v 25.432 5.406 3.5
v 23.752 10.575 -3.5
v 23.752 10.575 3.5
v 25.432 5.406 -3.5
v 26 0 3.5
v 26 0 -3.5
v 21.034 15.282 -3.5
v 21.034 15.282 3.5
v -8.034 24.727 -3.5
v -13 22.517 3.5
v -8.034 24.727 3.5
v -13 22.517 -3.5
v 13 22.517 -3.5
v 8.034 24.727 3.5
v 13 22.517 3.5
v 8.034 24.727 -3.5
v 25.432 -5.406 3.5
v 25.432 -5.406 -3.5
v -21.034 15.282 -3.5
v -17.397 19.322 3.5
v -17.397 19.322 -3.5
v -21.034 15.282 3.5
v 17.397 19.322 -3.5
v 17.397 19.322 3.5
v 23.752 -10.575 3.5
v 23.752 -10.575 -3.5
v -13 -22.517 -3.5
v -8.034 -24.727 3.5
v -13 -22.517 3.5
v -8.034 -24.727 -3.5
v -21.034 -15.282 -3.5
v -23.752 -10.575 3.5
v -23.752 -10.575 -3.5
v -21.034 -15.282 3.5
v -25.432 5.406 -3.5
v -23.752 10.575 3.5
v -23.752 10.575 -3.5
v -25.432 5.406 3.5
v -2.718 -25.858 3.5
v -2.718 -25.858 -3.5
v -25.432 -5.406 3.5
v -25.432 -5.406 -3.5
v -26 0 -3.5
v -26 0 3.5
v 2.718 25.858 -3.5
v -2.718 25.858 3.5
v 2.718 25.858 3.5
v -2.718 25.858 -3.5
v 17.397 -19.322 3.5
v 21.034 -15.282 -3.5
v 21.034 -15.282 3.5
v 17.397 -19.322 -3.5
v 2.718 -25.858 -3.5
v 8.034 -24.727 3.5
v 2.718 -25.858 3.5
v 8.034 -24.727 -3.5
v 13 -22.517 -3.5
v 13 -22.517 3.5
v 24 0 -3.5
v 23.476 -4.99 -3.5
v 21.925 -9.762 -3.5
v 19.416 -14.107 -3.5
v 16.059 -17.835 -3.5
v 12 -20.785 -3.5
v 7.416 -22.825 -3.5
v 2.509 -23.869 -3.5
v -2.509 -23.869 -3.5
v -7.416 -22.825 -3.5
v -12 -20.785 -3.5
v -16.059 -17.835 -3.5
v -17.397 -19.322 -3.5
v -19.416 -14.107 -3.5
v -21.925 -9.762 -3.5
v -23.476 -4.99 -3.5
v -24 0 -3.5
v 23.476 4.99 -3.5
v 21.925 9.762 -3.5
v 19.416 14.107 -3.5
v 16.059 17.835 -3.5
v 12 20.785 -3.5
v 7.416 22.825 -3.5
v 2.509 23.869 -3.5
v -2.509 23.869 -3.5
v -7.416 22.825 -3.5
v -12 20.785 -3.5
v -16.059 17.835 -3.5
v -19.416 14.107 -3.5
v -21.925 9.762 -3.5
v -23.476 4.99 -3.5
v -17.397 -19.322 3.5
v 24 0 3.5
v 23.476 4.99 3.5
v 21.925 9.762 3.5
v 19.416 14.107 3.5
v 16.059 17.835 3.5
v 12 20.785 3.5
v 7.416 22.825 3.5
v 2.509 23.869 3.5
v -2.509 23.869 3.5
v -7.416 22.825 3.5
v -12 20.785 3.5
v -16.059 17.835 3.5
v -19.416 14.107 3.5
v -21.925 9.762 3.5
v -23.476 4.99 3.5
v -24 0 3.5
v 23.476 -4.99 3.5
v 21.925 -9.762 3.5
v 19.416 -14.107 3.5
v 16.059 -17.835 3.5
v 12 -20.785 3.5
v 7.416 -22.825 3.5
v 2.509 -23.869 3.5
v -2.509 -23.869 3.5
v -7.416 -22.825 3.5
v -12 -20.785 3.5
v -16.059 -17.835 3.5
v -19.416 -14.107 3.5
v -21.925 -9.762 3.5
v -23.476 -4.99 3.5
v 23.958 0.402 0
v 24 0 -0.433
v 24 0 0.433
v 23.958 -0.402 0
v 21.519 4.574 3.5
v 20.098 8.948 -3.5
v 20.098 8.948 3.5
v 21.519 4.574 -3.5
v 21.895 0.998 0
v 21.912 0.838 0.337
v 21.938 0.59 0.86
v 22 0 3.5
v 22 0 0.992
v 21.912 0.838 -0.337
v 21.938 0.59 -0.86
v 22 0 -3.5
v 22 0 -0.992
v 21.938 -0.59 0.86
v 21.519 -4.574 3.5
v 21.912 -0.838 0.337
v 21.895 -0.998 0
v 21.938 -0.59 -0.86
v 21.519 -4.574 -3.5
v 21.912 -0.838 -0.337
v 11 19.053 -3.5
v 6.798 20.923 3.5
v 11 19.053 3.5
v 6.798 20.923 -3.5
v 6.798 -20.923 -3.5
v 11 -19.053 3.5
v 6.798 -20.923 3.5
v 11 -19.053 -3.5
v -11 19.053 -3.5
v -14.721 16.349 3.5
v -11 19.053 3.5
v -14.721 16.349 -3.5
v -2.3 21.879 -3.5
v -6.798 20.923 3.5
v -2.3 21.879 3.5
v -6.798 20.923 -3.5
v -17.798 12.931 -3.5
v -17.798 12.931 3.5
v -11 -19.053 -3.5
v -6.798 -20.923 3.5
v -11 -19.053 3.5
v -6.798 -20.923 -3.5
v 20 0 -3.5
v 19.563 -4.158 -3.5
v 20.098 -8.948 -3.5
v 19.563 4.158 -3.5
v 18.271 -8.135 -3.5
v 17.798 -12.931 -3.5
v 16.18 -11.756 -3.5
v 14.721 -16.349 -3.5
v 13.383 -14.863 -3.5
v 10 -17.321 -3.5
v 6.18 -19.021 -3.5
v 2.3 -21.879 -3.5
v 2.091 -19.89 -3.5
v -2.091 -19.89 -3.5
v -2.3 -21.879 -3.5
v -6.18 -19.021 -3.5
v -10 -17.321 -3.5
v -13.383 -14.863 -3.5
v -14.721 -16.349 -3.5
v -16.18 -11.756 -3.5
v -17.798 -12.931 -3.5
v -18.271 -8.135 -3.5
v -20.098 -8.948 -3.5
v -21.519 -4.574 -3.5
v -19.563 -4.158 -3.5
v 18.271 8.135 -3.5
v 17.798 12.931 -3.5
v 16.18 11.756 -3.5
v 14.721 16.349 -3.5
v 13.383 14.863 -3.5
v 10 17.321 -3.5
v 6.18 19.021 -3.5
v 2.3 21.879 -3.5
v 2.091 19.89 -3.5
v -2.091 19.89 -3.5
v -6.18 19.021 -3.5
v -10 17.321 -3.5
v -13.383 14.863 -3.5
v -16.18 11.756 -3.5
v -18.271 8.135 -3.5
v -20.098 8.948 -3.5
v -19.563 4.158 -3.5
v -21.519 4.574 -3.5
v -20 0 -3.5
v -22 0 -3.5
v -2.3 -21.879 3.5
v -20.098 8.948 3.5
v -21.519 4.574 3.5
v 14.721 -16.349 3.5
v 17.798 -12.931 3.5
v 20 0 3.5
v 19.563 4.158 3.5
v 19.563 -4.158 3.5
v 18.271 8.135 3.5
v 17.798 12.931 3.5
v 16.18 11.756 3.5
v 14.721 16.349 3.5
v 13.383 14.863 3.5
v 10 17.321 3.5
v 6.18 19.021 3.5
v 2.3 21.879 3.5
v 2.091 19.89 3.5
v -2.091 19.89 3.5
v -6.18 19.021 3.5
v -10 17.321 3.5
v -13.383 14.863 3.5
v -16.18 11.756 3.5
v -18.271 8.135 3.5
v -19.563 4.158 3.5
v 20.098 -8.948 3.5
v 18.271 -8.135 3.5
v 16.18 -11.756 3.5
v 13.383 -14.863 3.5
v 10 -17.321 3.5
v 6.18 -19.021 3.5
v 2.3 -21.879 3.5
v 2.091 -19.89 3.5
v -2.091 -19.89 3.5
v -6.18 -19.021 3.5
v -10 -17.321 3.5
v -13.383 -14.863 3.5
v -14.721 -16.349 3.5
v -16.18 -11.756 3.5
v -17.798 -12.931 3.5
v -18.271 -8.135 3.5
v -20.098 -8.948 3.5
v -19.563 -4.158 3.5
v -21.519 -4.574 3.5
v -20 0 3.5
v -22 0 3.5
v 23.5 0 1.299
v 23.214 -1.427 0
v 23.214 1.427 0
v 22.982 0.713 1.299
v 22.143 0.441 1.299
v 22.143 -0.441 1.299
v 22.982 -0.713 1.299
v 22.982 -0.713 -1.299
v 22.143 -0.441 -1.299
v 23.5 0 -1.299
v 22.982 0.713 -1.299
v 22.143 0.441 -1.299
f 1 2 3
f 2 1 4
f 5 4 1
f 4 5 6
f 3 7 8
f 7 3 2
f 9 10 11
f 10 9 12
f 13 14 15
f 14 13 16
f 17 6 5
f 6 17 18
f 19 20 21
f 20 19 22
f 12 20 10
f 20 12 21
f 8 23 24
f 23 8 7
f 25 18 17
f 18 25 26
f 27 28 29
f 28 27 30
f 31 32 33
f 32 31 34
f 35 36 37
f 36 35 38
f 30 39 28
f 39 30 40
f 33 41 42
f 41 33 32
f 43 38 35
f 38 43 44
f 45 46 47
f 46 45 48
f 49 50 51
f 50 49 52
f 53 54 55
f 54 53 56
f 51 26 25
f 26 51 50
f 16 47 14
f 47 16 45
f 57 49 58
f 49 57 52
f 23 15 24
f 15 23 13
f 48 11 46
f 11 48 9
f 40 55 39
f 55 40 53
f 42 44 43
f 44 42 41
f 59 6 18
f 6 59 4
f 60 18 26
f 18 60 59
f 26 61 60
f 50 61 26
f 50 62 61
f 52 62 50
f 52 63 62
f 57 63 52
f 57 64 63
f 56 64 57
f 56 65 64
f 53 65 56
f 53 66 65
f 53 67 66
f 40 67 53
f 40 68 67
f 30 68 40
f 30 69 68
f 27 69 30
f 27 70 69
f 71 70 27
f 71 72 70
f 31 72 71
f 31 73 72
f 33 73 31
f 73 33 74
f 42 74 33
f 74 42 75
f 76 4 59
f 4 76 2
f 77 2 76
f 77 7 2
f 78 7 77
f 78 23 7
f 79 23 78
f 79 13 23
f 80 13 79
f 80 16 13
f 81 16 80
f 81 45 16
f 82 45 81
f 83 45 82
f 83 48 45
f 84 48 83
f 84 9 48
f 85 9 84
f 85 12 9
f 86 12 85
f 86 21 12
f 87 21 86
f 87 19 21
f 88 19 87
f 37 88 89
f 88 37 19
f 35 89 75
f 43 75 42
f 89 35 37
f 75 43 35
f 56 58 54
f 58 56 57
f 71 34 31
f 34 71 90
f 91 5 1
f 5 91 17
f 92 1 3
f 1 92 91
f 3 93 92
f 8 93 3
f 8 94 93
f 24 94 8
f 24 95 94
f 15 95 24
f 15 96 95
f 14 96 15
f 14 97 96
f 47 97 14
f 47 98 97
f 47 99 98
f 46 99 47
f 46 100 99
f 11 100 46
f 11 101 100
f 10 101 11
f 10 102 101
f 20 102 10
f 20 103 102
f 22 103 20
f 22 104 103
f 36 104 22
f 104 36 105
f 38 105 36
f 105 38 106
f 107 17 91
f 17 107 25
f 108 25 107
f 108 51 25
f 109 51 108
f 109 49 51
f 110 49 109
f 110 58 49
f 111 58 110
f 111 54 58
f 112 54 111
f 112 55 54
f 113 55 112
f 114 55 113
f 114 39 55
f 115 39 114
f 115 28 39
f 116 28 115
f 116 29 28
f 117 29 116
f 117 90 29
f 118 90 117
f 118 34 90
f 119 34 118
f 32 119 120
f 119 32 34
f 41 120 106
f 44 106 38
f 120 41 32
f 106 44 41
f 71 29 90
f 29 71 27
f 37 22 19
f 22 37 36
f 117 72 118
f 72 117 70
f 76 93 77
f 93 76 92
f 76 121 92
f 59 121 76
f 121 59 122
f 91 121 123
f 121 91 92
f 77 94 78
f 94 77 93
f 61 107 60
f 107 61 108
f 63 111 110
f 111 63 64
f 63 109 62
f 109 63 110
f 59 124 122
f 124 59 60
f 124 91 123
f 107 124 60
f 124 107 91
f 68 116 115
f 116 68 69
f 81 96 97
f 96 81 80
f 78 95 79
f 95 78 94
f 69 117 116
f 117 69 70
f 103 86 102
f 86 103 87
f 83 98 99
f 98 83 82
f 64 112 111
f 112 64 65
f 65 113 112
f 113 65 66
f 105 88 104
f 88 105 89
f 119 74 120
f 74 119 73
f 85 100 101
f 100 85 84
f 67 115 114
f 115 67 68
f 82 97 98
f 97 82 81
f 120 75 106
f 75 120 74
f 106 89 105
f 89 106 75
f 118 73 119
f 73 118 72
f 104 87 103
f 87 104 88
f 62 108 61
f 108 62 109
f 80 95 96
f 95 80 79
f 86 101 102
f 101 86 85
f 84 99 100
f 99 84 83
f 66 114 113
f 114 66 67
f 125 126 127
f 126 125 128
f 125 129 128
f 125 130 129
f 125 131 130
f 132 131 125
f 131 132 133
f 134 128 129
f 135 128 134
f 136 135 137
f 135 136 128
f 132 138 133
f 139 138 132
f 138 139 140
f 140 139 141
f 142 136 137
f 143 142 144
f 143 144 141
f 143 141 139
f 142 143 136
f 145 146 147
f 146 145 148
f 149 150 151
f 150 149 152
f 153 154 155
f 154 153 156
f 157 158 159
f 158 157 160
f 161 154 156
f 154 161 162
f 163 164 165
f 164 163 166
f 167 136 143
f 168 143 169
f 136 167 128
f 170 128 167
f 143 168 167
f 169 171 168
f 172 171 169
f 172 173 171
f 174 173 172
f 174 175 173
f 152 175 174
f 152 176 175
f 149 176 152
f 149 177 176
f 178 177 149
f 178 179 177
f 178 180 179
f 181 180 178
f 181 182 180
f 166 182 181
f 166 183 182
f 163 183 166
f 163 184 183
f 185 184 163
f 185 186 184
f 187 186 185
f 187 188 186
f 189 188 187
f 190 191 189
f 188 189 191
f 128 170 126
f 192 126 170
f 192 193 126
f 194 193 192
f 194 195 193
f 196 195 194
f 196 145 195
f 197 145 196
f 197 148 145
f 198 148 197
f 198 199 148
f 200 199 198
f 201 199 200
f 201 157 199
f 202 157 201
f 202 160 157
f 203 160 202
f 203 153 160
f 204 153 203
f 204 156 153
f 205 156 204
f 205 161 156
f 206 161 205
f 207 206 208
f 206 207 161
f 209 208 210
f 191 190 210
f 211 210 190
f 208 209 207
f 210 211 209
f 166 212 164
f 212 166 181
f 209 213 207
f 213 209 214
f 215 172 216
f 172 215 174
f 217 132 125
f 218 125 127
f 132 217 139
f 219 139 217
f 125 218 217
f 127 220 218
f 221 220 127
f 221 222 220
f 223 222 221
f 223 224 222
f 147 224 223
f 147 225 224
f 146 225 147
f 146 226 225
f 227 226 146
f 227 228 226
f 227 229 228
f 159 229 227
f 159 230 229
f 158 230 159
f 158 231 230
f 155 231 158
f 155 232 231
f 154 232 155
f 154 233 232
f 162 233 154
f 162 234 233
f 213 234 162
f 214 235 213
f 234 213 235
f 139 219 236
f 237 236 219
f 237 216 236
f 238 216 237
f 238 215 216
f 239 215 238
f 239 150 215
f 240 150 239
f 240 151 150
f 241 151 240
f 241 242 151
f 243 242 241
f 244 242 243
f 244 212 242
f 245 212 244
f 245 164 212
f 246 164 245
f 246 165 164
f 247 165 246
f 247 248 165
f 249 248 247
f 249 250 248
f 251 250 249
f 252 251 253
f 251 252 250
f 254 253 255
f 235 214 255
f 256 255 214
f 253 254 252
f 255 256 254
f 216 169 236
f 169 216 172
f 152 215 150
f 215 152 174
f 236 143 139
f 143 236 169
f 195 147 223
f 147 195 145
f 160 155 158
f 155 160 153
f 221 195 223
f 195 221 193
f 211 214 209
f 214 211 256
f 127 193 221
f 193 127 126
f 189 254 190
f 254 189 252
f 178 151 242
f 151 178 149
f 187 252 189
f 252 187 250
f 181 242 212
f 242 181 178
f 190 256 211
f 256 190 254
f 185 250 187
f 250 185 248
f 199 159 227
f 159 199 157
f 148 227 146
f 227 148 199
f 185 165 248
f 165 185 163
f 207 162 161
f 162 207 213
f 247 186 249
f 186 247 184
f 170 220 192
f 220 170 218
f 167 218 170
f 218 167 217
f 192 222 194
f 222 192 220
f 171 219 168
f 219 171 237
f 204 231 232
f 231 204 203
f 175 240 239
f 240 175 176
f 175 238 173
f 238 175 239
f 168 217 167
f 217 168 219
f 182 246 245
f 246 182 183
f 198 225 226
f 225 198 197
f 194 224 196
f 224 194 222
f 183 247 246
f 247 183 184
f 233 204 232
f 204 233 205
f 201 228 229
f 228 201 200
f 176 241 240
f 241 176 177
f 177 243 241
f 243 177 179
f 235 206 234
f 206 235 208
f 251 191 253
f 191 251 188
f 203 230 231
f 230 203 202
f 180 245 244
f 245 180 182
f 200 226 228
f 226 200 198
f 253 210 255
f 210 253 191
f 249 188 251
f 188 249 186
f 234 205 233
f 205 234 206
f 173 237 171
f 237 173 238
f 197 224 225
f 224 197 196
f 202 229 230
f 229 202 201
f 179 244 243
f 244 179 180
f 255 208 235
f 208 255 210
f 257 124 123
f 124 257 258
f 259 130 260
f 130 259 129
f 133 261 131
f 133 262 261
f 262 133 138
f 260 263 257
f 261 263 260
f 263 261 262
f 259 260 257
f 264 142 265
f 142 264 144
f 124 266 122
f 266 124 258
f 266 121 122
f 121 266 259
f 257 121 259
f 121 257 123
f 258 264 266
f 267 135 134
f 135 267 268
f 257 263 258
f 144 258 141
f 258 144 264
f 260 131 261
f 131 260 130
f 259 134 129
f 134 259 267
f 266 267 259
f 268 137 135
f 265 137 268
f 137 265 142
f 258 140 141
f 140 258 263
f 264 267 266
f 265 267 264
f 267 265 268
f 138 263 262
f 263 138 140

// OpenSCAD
// Parameters
bore_diameter_mm = 40; //[20:80:0.5]
outer_diameter_mm = 52; //[26:104:0.5]
width_mm = 7; //[3.5:14:0.1]
inner_radius_mm = 20; //[10:40:0.5]
outer_radius_mm = 26; //[13:52:0.5]
radial_clearance_mm = 1.5; //[0.5:3:0.1]
ring_wall_mm = 2; //[1:4:0.1]
ball_diameter_mm = 3; //[1.5:6:0.1]
overlap_mm = 1; //[0.5:2:0.1]

// Inner Ring
module inner_ring() {
  difference() {
    cylinder(r=bore_diameter_mm/2 + ring_wall_mm, h=width_mm, center=true);
    cylinder(r=bore_diameter_mm/2, h=width_mm + 2*overlap_mm, center=true);
  }
}

// Outer Ring
module outer_ring() {
  difference() {
    cylinder(r=outer_diameter_mm/2, h=width_mm, center=true);
    cylinder(r=outer_diameter_mm/2 - ring_wall_mm, h=width_mm + 2*overlap_mm, center=true);
  }
}

// Bearing Ball
module bearing_ball() {
  translate([(bore_diameter_mm/2 + ring_wall_mm) + radial_clearance_mm/2, 0, 0])
    sphere(r=ball_diameter_mm/2, center=true);
}

// Ball Bearing Assembly
module ball_bearing() {
  difference() {
    union() {
      outer_ring();
      inner_ring();
    }
    cylinder(r=bore_diameter_mm/2, h=width_mm + 2*overlap_mm, center=true);
  }
}

// Complete Assembly
module assembly() {
  color("DimGray") ball_bearing();
  color("Silver") bearing_ball();
}

assembly();
